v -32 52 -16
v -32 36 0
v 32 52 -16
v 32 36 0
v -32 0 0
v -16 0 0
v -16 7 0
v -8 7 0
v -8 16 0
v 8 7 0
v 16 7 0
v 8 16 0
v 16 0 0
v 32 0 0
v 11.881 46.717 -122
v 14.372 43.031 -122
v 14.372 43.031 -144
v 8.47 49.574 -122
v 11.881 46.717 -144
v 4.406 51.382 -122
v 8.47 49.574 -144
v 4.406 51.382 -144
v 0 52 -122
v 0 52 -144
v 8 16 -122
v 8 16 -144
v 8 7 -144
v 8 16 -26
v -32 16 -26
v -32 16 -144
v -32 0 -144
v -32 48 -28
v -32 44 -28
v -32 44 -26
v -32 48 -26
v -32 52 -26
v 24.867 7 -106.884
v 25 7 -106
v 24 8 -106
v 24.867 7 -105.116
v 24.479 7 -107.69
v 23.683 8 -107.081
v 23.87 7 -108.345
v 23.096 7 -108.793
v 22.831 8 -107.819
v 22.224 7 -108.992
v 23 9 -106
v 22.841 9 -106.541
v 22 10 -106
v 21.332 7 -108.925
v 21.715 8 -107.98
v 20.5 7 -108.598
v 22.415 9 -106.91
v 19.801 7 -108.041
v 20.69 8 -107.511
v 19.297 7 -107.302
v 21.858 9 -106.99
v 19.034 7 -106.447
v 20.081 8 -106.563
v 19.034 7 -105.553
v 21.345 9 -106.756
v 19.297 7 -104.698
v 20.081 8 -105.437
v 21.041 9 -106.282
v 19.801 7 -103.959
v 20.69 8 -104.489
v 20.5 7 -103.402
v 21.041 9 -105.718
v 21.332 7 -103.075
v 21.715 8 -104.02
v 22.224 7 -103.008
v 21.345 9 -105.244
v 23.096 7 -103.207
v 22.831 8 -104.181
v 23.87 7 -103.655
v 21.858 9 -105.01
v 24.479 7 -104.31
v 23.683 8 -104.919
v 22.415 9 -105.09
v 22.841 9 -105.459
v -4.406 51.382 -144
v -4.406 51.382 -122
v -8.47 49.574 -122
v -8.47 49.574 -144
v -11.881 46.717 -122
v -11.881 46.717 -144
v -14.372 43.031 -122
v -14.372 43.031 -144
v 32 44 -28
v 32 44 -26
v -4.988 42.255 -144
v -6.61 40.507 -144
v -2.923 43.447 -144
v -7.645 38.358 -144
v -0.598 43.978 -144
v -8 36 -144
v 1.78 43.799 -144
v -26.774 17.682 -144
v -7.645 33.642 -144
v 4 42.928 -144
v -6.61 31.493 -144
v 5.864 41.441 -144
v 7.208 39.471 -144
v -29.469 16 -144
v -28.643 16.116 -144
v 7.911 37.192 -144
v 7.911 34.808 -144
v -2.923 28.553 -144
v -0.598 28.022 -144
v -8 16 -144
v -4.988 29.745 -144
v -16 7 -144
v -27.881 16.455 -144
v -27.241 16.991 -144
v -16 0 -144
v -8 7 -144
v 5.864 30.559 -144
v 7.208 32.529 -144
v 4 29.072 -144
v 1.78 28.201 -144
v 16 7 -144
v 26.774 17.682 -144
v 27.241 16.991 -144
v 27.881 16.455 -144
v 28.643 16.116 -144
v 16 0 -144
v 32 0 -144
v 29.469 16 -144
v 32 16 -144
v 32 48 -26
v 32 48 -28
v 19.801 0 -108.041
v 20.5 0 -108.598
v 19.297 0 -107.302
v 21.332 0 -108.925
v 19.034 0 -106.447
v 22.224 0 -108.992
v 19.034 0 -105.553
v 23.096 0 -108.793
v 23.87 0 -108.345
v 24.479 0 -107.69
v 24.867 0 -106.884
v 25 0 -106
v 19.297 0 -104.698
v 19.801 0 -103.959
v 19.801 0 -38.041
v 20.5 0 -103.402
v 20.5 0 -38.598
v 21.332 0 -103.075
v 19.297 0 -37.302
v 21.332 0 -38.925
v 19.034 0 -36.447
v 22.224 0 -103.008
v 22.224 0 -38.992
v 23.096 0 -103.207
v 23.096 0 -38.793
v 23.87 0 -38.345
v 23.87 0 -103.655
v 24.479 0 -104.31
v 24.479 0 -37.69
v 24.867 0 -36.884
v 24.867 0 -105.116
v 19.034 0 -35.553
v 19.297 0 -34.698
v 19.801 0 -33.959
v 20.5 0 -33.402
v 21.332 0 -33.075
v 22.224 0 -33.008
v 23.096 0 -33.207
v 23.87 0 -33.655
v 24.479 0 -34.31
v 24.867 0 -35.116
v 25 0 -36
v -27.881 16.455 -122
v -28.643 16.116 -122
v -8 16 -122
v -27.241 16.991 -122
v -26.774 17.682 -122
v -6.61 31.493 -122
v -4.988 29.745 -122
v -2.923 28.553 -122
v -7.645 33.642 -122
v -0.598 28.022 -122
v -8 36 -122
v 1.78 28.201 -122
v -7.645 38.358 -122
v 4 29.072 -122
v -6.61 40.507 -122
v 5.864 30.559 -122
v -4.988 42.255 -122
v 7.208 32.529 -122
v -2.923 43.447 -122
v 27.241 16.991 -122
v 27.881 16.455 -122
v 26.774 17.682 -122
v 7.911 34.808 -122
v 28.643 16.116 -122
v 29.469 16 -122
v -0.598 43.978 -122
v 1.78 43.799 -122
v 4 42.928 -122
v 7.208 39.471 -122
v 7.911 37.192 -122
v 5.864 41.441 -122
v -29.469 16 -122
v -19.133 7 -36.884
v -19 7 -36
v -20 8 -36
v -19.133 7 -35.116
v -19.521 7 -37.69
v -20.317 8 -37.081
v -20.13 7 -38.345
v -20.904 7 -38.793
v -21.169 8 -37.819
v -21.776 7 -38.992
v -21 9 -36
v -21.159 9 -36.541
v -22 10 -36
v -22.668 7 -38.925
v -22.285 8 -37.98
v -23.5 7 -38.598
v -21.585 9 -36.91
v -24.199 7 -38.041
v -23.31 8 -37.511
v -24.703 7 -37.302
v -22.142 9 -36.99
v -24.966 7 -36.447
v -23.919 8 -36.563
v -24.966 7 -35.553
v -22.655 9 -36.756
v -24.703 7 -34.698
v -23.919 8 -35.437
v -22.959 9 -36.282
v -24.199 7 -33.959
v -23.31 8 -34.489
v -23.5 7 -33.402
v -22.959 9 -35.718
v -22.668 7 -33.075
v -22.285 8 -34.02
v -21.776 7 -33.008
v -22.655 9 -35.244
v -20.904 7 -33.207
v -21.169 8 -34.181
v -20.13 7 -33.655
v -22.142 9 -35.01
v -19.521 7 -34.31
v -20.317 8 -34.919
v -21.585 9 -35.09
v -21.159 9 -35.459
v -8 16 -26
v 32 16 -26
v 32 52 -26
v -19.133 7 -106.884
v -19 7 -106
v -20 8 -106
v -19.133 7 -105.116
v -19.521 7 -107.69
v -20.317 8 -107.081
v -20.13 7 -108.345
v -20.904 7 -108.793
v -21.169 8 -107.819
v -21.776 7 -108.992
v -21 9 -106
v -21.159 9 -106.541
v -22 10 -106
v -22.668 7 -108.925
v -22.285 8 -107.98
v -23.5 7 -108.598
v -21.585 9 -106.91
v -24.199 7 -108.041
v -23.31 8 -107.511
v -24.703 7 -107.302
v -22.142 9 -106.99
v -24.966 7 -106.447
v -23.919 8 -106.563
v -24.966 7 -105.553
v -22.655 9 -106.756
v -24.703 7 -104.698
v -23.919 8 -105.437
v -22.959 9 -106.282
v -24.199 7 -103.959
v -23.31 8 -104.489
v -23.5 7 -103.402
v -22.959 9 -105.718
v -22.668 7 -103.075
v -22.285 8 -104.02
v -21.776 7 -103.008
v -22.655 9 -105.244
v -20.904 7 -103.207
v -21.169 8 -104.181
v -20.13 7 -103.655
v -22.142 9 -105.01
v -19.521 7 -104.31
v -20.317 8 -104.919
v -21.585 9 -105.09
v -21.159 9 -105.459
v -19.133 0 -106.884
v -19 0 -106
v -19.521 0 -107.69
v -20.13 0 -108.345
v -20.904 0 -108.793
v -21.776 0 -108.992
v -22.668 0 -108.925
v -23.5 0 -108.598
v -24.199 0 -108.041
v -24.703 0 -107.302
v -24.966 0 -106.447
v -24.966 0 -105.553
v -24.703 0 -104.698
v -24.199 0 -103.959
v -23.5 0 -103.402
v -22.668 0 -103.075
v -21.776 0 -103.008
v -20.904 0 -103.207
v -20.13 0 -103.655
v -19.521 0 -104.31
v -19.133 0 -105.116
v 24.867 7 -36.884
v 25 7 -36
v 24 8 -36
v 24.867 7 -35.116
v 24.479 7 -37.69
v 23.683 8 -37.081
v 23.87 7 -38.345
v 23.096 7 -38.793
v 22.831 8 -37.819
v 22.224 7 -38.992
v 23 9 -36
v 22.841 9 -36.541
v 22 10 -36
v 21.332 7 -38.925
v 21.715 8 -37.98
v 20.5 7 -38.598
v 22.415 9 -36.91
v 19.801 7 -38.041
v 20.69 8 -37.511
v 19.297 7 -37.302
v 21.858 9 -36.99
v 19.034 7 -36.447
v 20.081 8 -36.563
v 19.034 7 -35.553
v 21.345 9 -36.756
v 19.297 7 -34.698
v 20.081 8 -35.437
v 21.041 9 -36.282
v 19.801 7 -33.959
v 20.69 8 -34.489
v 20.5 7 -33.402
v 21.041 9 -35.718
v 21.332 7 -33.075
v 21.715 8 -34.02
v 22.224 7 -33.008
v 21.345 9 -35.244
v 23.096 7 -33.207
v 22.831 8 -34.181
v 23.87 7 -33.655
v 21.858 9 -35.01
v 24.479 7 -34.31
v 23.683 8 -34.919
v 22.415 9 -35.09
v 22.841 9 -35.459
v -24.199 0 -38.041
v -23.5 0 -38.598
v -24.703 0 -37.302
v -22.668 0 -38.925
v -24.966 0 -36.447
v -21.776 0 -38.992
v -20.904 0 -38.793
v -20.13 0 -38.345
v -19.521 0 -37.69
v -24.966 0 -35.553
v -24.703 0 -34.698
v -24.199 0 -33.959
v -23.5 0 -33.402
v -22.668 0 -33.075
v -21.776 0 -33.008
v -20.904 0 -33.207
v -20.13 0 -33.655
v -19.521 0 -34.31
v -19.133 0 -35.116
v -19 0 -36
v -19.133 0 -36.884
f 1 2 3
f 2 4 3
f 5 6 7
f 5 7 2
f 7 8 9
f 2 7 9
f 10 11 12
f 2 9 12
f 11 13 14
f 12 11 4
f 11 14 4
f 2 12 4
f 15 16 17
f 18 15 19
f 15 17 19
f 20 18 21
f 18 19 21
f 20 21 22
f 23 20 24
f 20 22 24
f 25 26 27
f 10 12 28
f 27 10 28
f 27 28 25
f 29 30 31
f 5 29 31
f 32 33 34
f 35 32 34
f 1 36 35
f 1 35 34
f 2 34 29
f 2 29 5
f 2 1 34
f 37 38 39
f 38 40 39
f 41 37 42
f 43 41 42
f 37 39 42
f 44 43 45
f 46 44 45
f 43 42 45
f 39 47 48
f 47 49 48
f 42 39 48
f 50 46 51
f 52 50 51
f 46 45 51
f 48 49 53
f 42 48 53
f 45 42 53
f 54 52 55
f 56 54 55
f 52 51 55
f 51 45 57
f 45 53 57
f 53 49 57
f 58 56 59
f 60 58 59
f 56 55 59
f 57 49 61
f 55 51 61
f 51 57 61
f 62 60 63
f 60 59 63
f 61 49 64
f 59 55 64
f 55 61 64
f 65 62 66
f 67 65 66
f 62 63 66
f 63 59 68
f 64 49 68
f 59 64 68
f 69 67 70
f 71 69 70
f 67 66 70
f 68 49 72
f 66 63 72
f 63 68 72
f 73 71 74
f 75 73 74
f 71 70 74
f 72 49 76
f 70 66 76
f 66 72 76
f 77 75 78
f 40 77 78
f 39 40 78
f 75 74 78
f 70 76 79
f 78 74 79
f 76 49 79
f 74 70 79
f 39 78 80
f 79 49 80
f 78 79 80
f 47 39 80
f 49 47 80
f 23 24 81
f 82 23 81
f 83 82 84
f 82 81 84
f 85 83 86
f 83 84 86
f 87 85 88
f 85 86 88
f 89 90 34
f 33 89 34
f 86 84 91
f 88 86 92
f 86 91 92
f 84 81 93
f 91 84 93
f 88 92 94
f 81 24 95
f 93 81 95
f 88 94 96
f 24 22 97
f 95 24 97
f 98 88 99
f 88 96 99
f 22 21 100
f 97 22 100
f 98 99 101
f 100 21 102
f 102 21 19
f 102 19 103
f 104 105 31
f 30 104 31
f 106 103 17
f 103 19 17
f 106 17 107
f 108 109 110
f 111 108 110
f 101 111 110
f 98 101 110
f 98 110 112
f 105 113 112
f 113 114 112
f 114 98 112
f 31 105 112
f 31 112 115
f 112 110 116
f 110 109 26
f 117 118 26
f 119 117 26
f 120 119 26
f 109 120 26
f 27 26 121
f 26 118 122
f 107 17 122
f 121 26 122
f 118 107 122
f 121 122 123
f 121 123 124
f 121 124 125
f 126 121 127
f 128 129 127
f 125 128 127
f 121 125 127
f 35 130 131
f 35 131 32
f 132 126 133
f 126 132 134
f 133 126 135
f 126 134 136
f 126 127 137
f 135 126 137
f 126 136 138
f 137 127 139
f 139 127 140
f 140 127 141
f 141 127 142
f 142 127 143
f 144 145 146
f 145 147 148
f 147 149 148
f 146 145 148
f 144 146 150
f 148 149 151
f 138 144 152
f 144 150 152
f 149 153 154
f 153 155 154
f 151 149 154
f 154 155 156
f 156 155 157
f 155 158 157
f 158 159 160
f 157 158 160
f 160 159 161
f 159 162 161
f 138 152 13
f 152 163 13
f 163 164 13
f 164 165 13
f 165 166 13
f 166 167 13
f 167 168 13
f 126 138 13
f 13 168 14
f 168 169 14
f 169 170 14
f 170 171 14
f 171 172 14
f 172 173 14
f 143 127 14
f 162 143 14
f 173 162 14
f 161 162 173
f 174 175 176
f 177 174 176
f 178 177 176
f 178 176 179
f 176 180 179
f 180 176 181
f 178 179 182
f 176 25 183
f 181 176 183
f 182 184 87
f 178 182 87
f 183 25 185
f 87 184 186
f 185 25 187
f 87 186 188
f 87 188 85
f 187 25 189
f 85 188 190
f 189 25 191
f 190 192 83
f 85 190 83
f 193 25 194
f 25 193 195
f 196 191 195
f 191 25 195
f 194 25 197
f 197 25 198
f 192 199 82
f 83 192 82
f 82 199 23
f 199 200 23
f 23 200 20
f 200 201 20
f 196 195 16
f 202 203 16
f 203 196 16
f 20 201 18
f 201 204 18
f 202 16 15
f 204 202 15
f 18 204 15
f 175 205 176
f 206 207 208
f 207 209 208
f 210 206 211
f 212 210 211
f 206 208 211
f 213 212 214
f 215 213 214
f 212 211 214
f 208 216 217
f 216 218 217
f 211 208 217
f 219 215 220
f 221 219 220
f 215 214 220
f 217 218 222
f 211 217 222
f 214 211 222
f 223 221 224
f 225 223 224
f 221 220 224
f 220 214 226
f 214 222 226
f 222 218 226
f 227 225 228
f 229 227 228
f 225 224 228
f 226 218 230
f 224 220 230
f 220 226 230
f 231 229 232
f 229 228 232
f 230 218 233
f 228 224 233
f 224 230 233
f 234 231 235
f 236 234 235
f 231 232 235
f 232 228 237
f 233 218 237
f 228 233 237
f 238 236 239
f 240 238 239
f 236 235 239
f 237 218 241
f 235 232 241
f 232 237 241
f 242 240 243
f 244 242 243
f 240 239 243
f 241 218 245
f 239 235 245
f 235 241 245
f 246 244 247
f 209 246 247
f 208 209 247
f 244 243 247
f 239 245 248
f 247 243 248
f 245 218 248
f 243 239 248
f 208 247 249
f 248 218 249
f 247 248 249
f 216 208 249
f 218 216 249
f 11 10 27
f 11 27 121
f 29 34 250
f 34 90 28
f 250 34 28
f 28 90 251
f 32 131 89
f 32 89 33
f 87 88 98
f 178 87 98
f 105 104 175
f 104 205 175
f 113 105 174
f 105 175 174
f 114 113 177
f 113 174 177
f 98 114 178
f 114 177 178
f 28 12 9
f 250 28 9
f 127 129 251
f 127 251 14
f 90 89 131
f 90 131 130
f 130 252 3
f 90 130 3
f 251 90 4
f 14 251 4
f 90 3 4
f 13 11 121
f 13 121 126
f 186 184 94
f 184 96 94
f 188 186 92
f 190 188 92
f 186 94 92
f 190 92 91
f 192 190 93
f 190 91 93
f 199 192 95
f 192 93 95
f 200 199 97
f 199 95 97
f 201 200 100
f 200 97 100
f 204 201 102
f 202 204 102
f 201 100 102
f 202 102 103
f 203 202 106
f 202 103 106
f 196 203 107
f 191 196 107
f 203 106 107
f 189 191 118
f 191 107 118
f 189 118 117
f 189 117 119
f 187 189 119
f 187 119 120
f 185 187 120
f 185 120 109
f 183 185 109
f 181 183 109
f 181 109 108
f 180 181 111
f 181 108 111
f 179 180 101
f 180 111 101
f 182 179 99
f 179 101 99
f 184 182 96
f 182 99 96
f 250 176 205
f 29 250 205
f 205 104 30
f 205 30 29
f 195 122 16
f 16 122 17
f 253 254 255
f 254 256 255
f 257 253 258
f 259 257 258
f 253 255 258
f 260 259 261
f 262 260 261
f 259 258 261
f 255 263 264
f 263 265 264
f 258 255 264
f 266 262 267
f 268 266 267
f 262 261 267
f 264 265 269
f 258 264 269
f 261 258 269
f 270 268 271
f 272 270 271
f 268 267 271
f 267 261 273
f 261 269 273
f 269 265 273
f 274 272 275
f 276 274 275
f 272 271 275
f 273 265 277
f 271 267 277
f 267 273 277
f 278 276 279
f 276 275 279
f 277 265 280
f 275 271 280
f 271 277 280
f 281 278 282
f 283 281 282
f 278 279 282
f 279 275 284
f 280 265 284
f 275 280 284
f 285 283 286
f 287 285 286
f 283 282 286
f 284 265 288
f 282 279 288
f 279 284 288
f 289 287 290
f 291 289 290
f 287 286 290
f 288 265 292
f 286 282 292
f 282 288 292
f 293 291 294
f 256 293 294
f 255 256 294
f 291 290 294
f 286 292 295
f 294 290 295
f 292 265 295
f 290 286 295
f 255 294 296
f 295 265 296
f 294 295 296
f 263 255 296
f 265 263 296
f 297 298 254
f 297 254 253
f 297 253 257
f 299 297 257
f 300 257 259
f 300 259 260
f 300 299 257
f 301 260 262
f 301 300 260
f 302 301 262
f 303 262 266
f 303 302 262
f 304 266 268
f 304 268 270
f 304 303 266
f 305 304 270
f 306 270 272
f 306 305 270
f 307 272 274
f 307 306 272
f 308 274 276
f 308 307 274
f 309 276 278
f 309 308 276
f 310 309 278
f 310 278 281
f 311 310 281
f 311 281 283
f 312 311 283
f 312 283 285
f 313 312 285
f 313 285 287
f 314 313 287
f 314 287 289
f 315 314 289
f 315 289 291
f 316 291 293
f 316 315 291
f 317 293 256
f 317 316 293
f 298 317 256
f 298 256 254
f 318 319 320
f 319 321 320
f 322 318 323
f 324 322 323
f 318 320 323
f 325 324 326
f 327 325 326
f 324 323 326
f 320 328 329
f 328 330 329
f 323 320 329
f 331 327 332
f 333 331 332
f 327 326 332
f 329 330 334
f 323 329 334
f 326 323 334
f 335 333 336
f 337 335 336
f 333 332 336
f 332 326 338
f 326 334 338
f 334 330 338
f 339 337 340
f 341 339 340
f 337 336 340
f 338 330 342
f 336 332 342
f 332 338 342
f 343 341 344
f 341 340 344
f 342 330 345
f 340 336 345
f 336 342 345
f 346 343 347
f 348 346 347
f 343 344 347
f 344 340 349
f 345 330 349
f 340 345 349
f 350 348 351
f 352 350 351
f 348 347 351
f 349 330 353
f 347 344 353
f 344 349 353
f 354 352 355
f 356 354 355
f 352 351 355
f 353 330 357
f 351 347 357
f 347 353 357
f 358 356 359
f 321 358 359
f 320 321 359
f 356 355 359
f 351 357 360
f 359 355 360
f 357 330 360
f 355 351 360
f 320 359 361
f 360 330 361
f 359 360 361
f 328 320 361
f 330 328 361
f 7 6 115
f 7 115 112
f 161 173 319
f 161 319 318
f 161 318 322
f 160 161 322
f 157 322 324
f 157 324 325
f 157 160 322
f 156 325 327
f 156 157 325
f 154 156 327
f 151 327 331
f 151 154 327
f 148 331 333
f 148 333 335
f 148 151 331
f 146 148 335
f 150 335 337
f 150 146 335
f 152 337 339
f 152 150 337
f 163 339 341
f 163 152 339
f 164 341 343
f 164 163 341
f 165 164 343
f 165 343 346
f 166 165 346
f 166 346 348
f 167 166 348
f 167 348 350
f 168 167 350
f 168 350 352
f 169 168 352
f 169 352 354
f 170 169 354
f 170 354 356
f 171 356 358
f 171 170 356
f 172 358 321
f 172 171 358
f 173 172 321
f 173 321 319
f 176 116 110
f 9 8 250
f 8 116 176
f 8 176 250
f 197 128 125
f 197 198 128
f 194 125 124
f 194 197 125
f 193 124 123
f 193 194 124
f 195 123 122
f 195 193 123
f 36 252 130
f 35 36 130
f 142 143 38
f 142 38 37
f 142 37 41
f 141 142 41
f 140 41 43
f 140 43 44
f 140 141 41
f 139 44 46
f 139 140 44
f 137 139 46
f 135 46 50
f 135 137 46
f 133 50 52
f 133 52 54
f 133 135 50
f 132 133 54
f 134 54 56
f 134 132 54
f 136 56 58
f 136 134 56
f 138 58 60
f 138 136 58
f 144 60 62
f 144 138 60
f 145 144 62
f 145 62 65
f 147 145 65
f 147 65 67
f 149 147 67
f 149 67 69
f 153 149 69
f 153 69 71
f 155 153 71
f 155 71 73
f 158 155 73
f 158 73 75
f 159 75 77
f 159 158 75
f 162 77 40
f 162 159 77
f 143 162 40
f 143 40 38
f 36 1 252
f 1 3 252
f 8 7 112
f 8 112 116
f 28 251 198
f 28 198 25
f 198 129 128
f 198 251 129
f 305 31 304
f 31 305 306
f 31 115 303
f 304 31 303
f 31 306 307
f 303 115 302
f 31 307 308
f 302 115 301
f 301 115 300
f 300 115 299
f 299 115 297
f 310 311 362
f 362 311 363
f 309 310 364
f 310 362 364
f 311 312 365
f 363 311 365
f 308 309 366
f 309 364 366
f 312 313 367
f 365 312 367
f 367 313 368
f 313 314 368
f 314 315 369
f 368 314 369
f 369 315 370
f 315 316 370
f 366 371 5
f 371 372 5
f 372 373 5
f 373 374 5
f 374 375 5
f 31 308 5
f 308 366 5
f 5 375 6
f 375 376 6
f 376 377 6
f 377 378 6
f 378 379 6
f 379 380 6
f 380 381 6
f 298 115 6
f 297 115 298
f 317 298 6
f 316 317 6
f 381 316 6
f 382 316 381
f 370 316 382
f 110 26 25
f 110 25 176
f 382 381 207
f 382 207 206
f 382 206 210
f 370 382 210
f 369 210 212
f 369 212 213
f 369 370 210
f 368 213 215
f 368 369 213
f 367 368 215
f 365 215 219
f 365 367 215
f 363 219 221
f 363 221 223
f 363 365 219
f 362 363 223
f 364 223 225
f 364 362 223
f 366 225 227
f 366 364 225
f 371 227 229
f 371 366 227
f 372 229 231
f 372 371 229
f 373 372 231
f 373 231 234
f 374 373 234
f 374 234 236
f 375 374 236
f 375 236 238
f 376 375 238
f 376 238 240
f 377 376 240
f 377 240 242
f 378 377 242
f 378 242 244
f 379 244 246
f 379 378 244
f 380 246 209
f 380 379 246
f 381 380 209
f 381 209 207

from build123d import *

# Parameters (mm, degrees)
BOSS_EXTRUDE1_DEPTH = 32
SKETCH2_R           = 3
CUT_EXTRUDE1_DEPTH  = 10
CHAMFER2_SIZE       = 3
CHAMFER3_SIZE       = 3
CHAMFER4_SIZE       = 3
CHAMFER5_SIZE       = 3
CUT_EXTRUDE3_DEPTH  = 145
CUT_EXTRUDE4_REACH  = 146
SKETCH7_R           = 8
CUT_EXTRUDE8_REACH  = 146
FILLET1_R           = 3
SKETCH9_W           = 64
SKETCH9_H           = 4
BOSS_EXTRUDE2_DEPTH = 2


with BuildPart() as part:
    # Sketch1 → Boss-Extrude1 (new body, symmetric)
    with BuildSketch(Plane(origin=(0, 0, 0), x_dir=(0, 0, -1), z_dir=(1, 0, 0))):
        Polygon((0, 0), (0, 36), (16, 52), (26, 52), (26, 16), (122, 16), (122, 52), (144, 52), (144, 0), align=None)
    extrude(amount=BOSS_EXTRUDE1_DEPTH, both=True)

    # Sketch2 → Cut-Extrude1 (cut)
    with BuildSketch(Plane(origin=(0, 0, 0), x_dir=(1, 0, 0), z_dir=(0, 1, 0))):
        with Locations((-22, 36)):
            Circle(SKETCH2_R)
        with Locations((22, 36)):
            Circle(SKETCH2_R)
        with Locations((-22, 106)):
            Circle(SKETCH2_R)
        with Locations((22, 106)):
            Circle(SKETCH2_R)
    extrude(amount=CUT_EXTRUDE1_DEPTH, mode=Mode.SUBTRACT)

    # Chamfer2
    chamfer2_edges = [part.edges().sort_by_distance(p)[0] for p in [
        (19, 10, -106),
    ]]
    chamfer(chamfer2_edges, length=CHAMFER2_SIZE)

    # Chamfer3
    chamfer3_edges = [part.edges().sort_by_distance(p)[0] for p in [
        (-25, 10, -106),
    ]]
    chamfer(chamfer3_edges, length=CHAMFER3_SIZE)

    # Chamfer4
    chamfer4_edges = [part.edges().sort_by_distance(p)[0] for p in [
        (19, 10, -36),
    ]]
    chamfer(chamfer4_edges, length=CHAMFER4_SIZE)

    # Chamfer5
    chamfer5_edges = [part.edges().sort_by_distance(p)[0] for p in [
        (-25, 10, -36),
    ]]
    chamfer(chamfer5_edges, length=CHAMFER5_SIZE)

    # Sketch6 → Cut-Extrude3 (cut, through all)
    with BuildSketch(Plane.XY):
        Polygon((-16, 0), (-16, 7), (-8, 7), (-8, 16), (0, 16), (8, 16), (8, 7), (16, 7), (16, 0), align=None)
    extrude(amount=-CUT_EXTRUDE3_DEPTH, mode=Mode.SUBTRACT)

    # Sketch7 → Cut-Extrude4 (cut, up to next)
    with BuildSketch(Plane(origin=(0, 0, -144), x_dir=(-1, 0, 0), z_dir=(0, 0, -1)), mode=Mode.PRIVATE) as cut_extrude4_sk1:
        with Locations((0, 36)):
            Circle(SKETCH7_R)
    cut_extrude4_tool1 = extrude(cut_extrude4_sk1.sketch, amount=-CUT_EXTRUDE4_REACH, mode=Mode.PRIVATE) & part.part
    add(cut_extrude4_tool1.solids().sort_by_distance((0, 36, -144))[0], mode=Mode.SUBTRACT)

    # Sketch8 → Cut-Extrude8 (cut, up to next)
    with BuildSketch(Plane(origin=(0, 0, -144), x_dir=(-1, 0, 0), z_dir=(0, 0, -1)), mode=Mode.PRIVATE) as cut_extrude8_sk1:
        with BuildLine():
            Line((-32, 16), (-27.596884244, 16))
            Line((-27.596884244, 16), (-14.372185951, 43.031377602))
            ThreePointArc((-14.372185951, 43.031377602), (-8.470476894, 49.573909576), (5.2e-08, 52))
            Line((5.2e-08, 52), (-32, 52))
            Line((-32, 52), (-32, 16))
        make_face()
    cut_extrude8_tool1 = extrude(cut_extrude8_sk1.sketch, amount=-CUT_EXTRUDE8_REACH, mode=Mode.PRIVATE) & part.part
    add(cut_extrude8_tool1.solids().sort_by_distance((23.880103, 38.416138, -144))[0], mode=Mode.SUBTRACT)
    # Sketch8 → Cut-Extrude8 (cut, up to next)
    with BuildSketch(Plane(origin=(0, 0, -144), x_dir=(-1, 0, 0), z_dir=(0, 0, -1)), mode=Mode.PRIVATE) as cut_extrude8_sk2:
        with BuildLine():
            Line((14.372185951, 43.031377602), (27.596884244, 16))
            Line((27.596884244, 16), (32, 16))
            Line((32, 16), (32, 52))
            Line((32, 52), (5.2e-08, 52))
            ThreePointArc((5.2e-08, 52), (8.470476938, 49.573909549), (14.372185951, 43.031377602))
        make_face()
    cut_extrude8_tool2 = extrude(cut_extrude8_sk2.sketch, amount=-CUT_EXTRUDE8_REACH, mode=Mode.PRIVATE) & part.part
    add(cut_extrude8_tool2.solids().sort_by_distance((-23.880103, 38.416138, -144))[0], mode=Mode.SUBTRACT)

    # Fillet1
    fillet1_edges = [part.edges().sort_by_distance(p)[0] for p in [
        (-27.596884244, 16, -133),
        (27.596884244, 16, -133),
    ]]
    fillet(fillet1_edges, radius=FILLET1_R)

    # Sketch9 → Boss-Extrude2 (add)
    with BuildSketch(Plane(origin=(0, 0, -26), x_dir=(-1, 0, 0), z_dir=(0, 0, -1))):
        with Locations((0, 46)):
            Rectangle(SKETCH9_W, SKETCH9_H)
    extrude(amount=BOSS_EXTRUDE2_DEPTH)


solid = part.part
